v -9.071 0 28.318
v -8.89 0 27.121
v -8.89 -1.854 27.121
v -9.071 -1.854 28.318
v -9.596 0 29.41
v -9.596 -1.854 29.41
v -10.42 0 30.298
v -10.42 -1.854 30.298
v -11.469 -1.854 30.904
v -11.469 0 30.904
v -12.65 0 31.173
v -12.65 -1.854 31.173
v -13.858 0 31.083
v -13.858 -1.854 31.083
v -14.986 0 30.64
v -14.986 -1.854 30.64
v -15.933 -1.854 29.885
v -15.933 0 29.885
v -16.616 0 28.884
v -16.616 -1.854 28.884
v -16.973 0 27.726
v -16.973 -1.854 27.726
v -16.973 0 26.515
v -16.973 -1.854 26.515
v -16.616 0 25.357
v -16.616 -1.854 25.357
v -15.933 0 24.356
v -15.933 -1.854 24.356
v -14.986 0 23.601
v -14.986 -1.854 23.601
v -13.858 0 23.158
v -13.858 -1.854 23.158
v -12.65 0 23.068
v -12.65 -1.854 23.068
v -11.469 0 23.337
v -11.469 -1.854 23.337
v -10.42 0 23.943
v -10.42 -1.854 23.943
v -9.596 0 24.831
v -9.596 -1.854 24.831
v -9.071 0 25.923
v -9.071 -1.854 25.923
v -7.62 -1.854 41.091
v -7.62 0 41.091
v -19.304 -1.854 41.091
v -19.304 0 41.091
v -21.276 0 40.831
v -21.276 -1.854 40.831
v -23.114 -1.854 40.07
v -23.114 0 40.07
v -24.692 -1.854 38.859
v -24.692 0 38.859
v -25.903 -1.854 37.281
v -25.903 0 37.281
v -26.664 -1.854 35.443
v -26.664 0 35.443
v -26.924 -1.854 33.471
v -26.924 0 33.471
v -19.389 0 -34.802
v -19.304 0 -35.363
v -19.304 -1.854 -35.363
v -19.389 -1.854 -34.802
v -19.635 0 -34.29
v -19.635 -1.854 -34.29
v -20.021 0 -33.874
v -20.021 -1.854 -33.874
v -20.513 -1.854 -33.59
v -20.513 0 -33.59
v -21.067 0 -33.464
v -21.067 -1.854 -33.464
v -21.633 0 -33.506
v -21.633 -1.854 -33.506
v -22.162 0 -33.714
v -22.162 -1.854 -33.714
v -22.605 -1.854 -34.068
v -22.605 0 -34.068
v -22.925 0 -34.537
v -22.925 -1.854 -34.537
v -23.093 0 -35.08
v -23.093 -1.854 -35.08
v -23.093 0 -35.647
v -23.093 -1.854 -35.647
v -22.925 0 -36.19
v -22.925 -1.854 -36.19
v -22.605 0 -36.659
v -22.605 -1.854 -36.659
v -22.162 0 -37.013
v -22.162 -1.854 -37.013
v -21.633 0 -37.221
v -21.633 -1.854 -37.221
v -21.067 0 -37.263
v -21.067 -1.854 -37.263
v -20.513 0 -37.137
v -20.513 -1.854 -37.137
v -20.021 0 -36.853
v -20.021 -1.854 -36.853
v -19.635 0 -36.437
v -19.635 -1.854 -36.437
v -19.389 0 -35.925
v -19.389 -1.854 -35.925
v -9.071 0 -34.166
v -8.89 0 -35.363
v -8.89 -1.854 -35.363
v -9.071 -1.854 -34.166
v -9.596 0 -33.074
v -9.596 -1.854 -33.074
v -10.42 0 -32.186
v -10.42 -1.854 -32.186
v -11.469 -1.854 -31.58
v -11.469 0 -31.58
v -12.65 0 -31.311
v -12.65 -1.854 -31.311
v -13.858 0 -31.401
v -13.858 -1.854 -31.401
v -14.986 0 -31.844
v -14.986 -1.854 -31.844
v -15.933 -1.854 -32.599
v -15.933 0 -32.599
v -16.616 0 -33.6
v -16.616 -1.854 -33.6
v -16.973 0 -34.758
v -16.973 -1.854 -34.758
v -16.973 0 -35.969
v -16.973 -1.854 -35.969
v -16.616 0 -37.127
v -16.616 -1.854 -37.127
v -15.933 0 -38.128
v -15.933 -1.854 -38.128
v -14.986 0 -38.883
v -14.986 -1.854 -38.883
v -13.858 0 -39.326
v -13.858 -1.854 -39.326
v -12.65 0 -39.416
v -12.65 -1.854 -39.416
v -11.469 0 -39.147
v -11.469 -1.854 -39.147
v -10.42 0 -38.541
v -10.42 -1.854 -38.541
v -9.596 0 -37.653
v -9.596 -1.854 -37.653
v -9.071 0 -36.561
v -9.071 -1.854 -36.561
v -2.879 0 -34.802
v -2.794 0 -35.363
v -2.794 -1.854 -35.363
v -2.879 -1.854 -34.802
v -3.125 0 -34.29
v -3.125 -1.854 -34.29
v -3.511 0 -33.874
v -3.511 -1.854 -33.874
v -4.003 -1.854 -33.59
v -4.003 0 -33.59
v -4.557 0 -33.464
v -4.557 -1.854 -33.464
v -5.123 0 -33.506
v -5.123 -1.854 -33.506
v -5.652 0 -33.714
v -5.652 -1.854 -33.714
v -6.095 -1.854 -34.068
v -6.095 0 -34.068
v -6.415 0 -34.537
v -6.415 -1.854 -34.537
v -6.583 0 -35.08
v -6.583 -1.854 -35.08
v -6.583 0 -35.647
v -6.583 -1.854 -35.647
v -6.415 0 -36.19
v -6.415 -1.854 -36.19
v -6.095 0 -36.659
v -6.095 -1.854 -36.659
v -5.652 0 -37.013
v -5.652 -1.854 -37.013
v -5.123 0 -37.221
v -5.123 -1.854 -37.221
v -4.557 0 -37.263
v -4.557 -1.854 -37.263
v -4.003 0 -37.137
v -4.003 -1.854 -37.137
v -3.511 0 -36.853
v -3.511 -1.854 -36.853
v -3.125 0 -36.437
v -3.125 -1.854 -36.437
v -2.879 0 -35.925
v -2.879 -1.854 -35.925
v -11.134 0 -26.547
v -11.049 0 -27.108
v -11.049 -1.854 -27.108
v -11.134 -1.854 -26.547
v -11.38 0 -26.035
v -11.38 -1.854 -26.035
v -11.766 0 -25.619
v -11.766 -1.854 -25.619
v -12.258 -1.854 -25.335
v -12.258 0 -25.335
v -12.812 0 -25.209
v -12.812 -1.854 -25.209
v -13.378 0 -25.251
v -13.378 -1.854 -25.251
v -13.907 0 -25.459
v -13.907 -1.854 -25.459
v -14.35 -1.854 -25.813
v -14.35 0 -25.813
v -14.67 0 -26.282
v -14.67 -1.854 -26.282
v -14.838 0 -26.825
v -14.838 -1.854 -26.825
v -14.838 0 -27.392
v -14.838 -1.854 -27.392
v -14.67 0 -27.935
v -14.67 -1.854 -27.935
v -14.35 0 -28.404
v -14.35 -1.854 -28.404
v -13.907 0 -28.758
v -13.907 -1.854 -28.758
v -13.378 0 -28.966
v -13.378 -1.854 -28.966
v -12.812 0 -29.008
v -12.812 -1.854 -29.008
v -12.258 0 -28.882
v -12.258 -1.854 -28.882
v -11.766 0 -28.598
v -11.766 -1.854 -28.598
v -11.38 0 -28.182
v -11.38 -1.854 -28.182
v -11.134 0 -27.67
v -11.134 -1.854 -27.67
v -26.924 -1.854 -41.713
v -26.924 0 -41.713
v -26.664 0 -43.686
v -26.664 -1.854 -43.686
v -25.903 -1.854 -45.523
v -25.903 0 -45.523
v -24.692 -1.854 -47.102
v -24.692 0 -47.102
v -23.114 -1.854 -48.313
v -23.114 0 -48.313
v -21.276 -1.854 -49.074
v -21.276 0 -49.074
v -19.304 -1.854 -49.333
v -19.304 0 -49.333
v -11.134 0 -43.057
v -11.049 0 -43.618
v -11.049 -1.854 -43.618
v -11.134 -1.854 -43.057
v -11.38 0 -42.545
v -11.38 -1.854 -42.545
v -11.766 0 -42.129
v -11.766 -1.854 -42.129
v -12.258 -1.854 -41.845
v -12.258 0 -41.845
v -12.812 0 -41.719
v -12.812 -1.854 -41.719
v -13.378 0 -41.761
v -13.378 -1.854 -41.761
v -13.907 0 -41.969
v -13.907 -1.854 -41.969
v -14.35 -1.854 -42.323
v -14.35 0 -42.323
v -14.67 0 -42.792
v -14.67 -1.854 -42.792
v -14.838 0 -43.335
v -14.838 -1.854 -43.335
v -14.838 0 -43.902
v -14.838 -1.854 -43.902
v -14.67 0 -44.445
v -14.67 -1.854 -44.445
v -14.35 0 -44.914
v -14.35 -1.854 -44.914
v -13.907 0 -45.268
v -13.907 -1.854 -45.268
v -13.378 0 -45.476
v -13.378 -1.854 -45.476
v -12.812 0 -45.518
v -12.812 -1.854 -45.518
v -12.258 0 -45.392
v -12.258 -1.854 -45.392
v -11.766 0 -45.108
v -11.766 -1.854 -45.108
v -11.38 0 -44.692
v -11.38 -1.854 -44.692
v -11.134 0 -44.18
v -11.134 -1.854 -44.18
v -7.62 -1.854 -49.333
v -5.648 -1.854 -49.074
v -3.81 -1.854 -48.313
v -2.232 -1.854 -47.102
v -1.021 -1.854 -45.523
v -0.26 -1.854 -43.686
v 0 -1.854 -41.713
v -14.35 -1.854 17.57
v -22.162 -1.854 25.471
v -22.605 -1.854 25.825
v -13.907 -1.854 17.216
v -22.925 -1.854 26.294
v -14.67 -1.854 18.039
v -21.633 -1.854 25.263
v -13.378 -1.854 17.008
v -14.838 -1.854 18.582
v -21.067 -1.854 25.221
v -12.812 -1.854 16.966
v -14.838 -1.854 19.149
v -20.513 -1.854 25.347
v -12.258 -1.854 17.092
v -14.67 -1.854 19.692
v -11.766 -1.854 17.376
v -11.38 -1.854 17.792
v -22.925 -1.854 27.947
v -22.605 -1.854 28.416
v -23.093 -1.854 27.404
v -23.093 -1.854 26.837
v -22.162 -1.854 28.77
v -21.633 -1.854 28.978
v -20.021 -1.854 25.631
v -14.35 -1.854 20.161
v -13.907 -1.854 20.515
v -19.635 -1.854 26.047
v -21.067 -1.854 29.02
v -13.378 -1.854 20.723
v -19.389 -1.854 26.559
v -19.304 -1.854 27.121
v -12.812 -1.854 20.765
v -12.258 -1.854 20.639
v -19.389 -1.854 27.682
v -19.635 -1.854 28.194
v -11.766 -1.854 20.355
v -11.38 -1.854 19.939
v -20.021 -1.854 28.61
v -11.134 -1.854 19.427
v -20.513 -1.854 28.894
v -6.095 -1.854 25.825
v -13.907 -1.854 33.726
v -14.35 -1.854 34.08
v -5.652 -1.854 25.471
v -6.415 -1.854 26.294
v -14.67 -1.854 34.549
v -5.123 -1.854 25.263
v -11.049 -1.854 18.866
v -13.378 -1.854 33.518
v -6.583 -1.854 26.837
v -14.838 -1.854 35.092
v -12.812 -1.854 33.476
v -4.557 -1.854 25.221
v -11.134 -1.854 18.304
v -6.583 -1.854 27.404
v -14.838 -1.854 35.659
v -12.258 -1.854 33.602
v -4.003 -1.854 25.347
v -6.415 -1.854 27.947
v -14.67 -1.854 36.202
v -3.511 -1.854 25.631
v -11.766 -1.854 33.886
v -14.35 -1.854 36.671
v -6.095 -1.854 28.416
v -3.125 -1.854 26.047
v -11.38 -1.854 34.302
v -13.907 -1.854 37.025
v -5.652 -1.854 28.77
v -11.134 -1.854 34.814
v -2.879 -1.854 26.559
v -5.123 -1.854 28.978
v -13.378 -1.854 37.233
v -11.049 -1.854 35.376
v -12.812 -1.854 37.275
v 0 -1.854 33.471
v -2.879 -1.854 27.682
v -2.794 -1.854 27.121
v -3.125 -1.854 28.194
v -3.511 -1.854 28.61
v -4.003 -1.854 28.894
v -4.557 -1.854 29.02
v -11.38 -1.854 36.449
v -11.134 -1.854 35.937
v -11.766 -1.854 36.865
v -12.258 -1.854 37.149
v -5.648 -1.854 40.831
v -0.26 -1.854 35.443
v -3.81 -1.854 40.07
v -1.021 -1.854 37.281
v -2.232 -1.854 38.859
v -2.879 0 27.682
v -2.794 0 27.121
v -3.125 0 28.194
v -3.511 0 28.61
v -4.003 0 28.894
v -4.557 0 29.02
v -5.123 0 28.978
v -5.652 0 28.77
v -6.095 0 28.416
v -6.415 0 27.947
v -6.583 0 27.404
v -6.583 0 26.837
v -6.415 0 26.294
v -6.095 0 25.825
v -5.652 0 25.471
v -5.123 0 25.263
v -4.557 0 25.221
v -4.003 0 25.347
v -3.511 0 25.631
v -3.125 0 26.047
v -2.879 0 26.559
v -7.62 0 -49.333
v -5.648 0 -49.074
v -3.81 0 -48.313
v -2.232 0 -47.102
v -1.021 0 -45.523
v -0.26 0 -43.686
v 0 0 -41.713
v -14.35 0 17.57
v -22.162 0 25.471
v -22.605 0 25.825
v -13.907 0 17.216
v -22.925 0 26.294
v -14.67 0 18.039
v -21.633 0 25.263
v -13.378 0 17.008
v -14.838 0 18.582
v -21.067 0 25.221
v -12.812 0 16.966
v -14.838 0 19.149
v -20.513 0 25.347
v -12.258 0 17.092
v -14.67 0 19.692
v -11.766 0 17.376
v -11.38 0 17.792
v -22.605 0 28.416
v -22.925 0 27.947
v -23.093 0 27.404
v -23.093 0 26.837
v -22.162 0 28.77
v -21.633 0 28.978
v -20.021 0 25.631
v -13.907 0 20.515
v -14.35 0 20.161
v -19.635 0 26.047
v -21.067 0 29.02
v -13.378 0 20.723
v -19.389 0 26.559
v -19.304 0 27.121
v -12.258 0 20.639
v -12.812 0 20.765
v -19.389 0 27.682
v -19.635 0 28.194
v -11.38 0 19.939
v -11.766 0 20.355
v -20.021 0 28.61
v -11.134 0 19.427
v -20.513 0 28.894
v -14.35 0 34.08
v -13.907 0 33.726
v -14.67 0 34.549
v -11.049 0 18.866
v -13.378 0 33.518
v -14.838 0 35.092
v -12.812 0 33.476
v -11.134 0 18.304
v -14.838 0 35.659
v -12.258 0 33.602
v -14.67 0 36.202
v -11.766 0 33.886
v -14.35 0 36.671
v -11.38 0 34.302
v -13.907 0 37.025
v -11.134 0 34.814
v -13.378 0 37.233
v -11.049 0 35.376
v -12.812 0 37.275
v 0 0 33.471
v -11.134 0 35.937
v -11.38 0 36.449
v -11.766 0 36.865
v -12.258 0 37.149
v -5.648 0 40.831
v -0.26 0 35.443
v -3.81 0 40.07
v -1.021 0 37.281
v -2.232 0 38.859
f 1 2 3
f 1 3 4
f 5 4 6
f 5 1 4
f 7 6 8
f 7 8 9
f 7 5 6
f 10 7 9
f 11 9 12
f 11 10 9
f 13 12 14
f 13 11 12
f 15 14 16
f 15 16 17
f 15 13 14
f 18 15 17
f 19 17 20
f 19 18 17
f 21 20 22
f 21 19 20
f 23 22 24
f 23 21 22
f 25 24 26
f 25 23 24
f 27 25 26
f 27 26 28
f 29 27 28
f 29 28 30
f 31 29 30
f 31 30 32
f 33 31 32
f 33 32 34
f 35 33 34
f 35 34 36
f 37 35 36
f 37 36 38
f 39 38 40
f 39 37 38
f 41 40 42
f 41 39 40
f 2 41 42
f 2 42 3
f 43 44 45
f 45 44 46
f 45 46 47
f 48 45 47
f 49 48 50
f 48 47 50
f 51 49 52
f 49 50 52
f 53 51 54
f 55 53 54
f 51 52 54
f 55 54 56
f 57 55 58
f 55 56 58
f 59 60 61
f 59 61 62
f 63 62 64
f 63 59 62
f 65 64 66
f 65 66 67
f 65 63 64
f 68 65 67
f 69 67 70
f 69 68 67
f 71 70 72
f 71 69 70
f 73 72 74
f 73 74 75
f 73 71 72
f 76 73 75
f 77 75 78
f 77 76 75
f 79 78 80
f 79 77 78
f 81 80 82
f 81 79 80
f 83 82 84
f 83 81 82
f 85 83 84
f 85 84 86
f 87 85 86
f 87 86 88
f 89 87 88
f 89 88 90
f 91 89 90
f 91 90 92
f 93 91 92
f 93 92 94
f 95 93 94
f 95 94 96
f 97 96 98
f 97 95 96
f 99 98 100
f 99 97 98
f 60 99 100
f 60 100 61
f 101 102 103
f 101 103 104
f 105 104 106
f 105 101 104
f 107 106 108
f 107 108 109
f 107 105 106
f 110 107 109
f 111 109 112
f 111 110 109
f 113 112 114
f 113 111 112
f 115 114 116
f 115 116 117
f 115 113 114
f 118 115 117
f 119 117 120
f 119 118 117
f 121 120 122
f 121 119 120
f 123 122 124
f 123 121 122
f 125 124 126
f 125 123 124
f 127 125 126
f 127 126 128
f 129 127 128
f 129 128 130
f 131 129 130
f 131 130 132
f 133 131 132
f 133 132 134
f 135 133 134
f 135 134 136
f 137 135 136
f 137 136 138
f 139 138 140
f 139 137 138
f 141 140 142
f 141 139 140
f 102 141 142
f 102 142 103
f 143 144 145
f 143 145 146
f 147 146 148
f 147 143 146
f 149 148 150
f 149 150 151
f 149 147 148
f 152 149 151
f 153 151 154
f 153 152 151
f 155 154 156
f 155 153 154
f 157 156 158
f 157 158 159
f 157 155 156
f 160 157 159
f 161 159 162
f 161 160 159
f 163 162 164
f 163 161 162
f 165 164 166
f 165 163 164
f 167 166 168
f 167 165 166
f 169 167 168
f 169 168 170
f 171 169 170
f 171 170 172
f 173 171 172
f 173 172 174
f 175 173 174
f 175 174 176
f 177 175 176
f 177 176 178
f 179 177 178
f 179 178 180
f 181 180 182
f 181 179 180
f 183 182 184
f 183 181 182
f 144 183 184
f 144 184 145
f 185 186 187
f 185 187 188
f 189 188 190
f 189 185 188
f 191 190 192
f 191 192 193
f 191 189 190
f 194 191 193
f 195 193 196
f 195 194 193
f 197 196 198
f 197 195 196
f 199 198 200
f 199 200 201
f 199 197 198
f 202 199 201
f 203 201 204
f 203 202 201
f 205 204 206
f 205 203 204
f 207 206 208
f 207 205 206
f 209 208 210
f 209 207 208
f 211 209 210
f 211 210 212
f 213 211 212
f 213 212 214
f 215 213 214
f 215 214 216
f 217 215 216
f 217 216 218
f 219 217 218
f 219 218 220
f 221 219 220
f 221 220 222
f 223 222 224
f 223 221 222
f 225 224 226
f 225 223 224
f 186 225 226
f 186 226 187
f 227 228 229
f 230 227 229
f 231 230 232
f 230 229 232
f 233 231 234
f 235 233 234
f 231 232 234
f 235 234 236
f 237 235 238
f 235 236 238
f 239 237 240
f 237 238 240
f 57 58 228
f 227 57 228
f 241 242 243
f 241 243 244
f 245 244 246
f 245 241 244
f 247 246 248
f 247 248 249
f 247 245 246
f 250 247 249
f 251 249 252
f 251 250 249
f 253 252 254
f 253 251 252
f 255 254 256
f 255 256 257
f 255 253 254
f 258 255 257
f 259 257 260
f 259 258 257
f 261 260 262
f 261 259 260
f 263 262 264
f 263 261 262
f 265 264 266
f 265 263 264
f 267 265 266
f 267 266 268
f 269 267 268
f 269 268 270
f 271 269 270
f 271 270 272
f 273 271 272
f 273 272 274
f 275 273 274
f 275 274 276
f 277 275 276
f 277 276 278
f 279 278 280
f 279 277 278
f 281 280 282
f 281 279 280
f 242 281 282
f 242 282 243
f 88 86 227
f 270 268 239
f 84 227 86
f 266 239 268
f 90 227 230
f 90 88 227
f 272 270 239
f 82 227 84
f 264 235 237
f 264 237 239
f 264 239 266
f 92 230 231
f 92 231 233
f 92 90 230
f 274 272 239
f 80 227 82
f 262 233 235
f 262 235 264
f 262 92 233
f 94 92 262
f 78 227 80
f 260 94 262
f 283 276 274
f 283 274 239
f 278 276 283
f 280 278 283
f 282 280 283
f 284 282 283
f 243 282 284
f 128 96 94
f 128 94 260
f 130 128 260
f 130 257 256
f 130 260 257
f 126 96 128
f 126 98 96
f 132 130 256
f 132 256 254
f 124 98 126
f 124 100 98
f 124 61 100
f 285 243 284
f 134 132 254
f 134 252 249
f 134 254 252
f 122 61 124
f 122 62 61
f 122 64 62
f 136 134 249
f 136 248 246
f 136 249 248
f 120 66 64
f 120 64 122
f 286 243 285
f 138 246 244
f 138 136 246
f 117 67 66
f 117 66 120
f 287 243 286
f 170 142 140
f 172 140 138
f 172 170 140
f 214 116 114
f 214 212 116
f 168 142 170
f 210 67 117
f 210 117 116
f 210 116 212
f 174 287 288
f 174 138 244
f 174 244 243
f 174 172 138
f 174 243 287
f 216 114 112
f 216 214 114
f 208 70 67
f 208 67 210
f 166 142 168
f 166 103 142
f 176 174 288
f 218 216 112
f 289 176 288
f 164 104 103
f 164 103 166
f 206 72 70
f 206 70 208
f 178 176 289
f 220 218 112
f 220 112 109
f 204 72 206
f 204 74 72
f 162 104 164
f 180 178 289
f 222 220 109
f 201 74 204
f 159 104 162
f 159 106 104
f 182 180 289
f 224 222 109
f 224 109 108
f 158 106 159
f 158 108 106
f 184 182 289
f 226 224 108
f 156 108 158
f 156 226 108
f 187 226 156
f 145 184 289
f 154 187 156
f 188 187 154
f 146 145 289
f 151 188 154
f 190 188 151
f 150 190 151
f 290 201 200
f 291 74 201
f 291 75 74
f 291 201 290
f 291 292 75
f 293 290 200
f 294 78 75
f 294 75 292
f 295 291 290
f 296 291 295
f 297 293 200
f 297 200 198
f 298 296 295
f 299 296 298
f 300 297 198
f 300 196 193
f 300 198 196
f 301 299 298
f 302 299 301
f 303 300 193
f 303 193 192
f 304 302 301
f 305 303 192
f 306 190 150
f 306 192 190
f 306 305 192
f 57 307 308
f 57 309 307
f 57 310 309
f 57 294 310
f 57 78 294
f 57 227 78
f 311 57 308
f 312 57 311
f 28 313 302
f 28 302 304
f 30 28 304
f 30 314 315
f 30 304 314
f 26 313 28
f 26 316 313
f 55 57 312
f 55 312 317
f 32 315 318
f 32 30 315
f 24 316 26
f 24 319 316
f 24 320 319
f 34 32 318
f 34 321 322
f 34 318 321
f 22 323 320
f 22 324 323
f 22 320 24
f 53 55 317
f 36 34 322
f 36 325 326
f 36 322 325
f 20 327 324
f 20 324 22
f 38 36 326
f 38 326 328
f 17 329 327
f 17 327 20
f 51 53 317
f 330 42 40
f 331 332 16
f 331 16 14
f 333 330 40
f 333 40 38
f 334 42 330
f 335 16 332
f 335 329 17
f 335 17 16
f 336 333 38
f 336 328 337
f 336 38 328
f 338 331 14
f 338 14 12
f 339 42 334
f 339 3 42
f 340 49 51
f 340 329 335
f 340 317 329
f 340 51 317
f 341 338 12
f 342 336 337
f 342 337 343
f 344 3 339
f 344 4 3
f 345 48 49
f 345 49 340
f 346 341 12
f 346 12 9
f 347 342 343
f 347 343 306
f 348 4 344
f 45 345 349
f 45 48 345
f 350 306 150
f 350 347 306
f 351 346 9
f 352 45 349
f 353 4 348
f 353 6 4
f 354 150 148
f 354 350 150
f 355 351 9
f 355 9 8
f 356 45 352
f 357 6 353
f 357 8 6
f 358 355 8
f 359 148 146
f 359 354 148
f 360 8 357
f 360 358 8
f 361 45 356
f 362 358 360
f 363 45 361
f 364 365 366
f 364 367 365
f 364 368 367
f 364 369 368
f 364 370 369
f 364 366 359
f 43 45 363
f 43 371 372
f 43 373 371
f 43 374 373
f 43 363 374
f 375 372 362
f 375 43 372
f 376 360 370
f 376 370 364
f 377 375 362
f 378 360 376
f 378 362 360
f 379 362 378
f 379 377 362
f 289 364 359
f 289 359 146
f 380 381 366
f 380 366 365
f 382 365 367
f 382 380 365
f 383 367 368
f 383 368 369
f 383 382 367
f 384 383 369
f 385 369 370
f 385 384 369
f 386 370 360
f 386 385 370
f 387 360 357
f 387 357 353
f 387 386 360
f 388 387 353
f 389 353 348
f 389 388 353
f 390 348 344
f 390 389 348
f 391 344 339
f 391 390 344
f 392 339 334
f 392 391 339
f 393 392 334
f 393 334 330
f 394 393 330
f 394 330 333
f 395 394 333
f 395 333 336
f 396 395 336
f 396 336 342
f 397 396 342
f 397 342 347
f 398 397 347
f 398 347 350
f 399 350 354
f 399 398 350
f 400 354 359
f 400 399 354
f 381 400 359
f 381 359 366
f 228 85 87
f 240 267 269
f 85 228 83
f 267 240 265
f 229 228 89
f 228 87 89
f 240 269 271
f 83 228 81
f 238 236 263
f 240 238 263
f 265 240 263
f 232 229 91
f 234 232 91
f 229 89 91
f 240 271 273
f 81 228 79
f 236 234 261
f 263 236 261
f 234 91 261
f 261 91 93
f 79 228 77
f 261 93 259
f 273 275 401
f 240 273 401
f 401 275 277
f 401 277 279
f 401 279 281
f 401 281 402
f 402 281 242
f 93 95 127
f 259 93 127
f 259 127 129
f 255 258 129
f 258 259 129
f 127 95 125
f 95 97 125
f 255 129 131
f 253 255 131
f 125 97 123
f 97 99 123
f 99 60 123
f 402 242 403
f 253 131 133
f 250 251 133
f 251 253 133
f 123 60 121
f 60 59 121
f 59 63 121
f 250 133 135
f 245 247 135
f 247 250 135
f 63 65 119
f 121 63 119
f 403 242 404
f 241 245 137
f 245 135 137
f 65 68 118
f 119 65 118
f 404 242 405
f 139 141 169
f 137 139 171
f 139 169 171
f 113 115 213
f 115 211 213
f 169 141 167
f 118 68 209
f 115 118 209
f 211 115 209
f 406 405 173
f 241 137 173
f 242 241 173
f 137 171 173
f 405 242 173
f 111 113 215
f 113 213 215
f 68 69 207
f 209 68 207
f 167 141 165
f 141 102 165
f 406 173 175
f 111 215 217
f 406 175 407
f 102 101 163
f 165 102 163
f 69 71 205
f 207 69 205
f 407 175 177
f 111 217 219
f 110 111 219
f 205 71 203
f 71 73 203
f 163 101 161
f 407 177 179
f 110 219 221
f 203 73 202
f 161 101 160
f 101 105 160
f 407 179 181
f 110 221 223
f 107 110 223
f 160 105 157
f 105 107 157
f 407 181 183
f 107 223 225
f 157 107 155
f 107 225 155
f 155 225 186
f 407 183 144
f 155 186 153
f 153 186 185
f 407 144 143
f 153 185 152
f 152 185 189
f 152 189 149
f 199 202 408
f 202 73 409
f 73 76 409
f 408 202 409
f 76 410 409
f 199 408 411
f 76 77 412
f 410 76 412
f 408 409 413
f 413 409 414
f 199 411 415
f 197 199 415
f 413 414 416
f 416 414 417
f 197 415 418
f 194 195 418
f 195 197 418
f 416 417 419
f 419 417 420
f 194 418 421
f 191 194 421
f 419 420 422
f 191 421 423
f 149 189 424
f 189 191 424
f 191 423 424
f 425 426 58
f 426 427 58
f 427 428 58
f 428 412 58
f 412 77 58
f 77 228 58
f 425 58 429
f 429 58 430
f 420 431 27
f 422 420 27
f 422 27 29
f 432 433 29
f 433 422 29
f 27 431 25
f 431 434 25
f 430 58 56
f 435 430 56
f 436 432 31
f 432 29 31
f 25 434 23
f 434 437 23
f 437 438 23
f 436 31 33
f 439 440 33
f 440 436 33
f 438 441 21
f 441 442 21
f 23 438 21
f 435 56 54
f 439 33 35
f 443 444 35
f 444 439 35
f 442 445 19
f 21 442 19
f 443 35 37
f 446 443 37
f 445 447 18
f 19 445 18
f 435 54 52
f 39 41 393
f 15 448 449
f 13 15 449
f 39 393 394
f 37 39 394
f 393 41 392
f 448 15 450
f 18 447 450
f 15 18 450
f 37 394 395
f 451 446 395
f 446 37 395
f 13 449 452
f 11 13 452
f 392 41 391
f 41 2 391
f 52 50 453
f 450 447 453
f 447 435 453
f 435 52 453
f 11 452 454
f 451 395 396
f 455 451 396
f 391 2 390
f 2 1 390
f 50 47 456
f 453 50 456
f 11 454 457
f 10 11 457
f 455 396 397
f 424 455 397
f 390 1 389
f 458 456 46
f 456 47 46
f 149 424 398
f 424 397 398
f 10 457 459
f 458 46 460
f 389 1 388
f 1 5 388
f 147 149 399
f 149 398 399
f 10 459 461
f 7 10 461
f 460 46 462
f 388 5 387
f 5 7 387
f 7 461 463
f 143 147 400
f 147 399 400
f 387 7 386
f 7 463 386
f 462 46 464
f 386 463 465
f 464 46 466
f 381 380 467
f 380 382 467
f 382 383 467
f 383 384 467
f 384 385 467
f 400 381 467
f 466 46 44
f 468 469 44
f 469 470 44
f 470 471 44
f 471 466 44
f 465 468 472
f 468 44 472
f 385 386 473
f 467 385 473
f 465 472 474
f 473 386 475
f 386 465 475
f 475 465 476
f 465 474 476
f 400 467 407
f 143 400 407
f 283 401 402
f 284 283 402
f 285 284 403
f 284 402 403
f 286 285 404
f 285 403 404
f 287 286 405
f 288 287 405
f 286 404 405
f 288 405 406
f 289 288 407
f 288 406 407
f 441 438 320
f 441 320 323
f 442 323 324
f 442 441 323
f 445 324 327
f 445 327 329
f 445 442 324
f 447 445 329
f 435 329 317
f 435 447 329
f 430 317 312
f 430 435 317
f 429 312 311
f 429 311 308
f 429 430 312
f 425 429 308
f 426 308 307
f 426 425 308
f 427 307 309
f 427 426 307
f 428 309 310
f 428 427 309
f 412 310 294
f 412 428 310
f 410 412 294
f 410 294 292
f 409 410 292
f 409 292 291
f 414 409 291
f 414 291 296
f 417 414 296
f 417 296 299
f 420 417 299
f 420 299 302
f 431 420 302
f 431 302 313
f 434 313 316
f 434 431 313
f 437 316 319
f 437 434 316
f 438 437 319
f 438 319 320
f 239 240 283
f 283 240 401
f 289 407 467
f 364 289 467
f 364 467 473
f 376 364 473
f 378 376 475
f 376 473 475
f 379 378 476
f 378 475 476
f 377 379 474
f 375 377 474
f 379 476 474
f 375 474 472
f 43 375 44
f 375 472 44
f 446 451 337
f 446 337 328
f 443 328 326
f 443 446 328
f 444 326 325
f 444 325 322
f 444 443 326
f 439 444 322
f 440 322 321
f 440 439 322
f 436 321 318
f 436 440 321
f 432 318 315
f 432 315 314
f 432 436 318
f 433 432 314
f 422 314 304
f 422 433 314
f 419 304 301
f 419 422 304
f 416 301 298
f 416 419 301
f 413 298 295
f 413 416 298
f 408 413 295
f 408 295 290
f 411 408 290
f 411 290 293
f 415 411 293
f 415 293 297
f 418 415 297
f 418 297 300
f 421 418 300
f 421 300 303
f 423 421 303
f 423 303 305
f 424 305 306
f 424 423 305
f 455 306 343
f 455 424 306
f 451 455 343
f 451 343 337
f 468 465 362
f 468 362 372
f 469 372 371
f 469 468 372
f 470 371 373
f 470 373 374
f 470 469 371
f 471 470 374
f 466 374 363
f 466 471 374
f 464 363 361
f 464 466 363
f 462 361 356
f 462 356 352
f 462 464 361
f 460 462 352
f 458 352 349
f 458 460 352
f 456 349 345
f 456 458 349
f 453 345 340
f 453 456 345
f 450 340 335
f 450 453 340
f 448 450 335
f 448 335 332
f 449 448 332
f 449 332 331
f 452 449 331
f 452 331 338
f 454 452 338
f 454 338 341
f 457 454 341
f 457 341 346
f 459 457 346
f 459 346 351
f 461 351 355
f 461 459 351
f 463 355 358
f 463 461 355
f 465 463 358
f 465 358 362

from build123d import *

# Parameters (mm, degrees)
F0_R     = 1.905
F0_R_2   = 4.064
F1_DEPTH = 1.8542


with BuildPart() as f1:
    # F0 (on Front) → F1 (new body)
    with BuildSketch(Plane.XZ):
        with BuildLine():
            ThreePointArc((0, 33.470551), (-2.231846, 38.858705), (-7.62, 41.090551))
            Line((-7.62, 41.090551), (-19.304, 41.090551))
            ThreePointArc((-19.304, 41.090551), (-24.692154, 38.858705), (-26.924, 33.470551))
            Line((-26.924, 33.470551), (-26.924, -41.713449))
            ThreePointArc((-26.924, -41.713449), (-24.692154, -47.101602), (-19.304, -49.333449))
            Line((-19.304, -49.333449), (-7.62, -49.333449))
            ThreePointArc((-7.62, -49.333449), (-2.231846, -47.101602), (0, -41.713449))
            Line((0, -41.713449), (0, 33.470551))
        make_face()
        with Locations((-21.209, -35.363449)):
            Circle(F0_R, mode=Mode.SUBTRACT)
        with Locations((-12.954, -43.618449)):
            Circle(F0_R, mode=Mode.SUBTRACT)
        with Locations((-12.954, -35.363449)):
            Circle(F0_R_2, mode=Mode.SUBTRACT)
        with Locations((-12.954, -27.108449)):
            Circle(F0_R, mode=Mode.SUBTRACT)
        with Locations((-4.699, -35.363449)):
            Circle(F0_R, mode=Mode.SUBTRACT)
        with Locations((-21.209, 27.120551)):
            Circle(F0_R, mode=Mode.SUBTRACT)
        with Locations((-12.954, 18.865551)):
            Circle(F0_R, mode=Mode.SUBTRACT)
        with Locations((-12.954, 27.120551)):
            Circle(F0_R_2, mode=Mode.SUBTRACT)
        with Locations((-12.954, 35.375551)):
            Circle(F0_R, mode=Mode.SUBTRACT)
        with Locations((-4.699, 27.120551)):
            Circle(F0_R, mode=Mode.SUBTRACT)
    extrude(amount=F1_DEPTH)


solid = f1.part
